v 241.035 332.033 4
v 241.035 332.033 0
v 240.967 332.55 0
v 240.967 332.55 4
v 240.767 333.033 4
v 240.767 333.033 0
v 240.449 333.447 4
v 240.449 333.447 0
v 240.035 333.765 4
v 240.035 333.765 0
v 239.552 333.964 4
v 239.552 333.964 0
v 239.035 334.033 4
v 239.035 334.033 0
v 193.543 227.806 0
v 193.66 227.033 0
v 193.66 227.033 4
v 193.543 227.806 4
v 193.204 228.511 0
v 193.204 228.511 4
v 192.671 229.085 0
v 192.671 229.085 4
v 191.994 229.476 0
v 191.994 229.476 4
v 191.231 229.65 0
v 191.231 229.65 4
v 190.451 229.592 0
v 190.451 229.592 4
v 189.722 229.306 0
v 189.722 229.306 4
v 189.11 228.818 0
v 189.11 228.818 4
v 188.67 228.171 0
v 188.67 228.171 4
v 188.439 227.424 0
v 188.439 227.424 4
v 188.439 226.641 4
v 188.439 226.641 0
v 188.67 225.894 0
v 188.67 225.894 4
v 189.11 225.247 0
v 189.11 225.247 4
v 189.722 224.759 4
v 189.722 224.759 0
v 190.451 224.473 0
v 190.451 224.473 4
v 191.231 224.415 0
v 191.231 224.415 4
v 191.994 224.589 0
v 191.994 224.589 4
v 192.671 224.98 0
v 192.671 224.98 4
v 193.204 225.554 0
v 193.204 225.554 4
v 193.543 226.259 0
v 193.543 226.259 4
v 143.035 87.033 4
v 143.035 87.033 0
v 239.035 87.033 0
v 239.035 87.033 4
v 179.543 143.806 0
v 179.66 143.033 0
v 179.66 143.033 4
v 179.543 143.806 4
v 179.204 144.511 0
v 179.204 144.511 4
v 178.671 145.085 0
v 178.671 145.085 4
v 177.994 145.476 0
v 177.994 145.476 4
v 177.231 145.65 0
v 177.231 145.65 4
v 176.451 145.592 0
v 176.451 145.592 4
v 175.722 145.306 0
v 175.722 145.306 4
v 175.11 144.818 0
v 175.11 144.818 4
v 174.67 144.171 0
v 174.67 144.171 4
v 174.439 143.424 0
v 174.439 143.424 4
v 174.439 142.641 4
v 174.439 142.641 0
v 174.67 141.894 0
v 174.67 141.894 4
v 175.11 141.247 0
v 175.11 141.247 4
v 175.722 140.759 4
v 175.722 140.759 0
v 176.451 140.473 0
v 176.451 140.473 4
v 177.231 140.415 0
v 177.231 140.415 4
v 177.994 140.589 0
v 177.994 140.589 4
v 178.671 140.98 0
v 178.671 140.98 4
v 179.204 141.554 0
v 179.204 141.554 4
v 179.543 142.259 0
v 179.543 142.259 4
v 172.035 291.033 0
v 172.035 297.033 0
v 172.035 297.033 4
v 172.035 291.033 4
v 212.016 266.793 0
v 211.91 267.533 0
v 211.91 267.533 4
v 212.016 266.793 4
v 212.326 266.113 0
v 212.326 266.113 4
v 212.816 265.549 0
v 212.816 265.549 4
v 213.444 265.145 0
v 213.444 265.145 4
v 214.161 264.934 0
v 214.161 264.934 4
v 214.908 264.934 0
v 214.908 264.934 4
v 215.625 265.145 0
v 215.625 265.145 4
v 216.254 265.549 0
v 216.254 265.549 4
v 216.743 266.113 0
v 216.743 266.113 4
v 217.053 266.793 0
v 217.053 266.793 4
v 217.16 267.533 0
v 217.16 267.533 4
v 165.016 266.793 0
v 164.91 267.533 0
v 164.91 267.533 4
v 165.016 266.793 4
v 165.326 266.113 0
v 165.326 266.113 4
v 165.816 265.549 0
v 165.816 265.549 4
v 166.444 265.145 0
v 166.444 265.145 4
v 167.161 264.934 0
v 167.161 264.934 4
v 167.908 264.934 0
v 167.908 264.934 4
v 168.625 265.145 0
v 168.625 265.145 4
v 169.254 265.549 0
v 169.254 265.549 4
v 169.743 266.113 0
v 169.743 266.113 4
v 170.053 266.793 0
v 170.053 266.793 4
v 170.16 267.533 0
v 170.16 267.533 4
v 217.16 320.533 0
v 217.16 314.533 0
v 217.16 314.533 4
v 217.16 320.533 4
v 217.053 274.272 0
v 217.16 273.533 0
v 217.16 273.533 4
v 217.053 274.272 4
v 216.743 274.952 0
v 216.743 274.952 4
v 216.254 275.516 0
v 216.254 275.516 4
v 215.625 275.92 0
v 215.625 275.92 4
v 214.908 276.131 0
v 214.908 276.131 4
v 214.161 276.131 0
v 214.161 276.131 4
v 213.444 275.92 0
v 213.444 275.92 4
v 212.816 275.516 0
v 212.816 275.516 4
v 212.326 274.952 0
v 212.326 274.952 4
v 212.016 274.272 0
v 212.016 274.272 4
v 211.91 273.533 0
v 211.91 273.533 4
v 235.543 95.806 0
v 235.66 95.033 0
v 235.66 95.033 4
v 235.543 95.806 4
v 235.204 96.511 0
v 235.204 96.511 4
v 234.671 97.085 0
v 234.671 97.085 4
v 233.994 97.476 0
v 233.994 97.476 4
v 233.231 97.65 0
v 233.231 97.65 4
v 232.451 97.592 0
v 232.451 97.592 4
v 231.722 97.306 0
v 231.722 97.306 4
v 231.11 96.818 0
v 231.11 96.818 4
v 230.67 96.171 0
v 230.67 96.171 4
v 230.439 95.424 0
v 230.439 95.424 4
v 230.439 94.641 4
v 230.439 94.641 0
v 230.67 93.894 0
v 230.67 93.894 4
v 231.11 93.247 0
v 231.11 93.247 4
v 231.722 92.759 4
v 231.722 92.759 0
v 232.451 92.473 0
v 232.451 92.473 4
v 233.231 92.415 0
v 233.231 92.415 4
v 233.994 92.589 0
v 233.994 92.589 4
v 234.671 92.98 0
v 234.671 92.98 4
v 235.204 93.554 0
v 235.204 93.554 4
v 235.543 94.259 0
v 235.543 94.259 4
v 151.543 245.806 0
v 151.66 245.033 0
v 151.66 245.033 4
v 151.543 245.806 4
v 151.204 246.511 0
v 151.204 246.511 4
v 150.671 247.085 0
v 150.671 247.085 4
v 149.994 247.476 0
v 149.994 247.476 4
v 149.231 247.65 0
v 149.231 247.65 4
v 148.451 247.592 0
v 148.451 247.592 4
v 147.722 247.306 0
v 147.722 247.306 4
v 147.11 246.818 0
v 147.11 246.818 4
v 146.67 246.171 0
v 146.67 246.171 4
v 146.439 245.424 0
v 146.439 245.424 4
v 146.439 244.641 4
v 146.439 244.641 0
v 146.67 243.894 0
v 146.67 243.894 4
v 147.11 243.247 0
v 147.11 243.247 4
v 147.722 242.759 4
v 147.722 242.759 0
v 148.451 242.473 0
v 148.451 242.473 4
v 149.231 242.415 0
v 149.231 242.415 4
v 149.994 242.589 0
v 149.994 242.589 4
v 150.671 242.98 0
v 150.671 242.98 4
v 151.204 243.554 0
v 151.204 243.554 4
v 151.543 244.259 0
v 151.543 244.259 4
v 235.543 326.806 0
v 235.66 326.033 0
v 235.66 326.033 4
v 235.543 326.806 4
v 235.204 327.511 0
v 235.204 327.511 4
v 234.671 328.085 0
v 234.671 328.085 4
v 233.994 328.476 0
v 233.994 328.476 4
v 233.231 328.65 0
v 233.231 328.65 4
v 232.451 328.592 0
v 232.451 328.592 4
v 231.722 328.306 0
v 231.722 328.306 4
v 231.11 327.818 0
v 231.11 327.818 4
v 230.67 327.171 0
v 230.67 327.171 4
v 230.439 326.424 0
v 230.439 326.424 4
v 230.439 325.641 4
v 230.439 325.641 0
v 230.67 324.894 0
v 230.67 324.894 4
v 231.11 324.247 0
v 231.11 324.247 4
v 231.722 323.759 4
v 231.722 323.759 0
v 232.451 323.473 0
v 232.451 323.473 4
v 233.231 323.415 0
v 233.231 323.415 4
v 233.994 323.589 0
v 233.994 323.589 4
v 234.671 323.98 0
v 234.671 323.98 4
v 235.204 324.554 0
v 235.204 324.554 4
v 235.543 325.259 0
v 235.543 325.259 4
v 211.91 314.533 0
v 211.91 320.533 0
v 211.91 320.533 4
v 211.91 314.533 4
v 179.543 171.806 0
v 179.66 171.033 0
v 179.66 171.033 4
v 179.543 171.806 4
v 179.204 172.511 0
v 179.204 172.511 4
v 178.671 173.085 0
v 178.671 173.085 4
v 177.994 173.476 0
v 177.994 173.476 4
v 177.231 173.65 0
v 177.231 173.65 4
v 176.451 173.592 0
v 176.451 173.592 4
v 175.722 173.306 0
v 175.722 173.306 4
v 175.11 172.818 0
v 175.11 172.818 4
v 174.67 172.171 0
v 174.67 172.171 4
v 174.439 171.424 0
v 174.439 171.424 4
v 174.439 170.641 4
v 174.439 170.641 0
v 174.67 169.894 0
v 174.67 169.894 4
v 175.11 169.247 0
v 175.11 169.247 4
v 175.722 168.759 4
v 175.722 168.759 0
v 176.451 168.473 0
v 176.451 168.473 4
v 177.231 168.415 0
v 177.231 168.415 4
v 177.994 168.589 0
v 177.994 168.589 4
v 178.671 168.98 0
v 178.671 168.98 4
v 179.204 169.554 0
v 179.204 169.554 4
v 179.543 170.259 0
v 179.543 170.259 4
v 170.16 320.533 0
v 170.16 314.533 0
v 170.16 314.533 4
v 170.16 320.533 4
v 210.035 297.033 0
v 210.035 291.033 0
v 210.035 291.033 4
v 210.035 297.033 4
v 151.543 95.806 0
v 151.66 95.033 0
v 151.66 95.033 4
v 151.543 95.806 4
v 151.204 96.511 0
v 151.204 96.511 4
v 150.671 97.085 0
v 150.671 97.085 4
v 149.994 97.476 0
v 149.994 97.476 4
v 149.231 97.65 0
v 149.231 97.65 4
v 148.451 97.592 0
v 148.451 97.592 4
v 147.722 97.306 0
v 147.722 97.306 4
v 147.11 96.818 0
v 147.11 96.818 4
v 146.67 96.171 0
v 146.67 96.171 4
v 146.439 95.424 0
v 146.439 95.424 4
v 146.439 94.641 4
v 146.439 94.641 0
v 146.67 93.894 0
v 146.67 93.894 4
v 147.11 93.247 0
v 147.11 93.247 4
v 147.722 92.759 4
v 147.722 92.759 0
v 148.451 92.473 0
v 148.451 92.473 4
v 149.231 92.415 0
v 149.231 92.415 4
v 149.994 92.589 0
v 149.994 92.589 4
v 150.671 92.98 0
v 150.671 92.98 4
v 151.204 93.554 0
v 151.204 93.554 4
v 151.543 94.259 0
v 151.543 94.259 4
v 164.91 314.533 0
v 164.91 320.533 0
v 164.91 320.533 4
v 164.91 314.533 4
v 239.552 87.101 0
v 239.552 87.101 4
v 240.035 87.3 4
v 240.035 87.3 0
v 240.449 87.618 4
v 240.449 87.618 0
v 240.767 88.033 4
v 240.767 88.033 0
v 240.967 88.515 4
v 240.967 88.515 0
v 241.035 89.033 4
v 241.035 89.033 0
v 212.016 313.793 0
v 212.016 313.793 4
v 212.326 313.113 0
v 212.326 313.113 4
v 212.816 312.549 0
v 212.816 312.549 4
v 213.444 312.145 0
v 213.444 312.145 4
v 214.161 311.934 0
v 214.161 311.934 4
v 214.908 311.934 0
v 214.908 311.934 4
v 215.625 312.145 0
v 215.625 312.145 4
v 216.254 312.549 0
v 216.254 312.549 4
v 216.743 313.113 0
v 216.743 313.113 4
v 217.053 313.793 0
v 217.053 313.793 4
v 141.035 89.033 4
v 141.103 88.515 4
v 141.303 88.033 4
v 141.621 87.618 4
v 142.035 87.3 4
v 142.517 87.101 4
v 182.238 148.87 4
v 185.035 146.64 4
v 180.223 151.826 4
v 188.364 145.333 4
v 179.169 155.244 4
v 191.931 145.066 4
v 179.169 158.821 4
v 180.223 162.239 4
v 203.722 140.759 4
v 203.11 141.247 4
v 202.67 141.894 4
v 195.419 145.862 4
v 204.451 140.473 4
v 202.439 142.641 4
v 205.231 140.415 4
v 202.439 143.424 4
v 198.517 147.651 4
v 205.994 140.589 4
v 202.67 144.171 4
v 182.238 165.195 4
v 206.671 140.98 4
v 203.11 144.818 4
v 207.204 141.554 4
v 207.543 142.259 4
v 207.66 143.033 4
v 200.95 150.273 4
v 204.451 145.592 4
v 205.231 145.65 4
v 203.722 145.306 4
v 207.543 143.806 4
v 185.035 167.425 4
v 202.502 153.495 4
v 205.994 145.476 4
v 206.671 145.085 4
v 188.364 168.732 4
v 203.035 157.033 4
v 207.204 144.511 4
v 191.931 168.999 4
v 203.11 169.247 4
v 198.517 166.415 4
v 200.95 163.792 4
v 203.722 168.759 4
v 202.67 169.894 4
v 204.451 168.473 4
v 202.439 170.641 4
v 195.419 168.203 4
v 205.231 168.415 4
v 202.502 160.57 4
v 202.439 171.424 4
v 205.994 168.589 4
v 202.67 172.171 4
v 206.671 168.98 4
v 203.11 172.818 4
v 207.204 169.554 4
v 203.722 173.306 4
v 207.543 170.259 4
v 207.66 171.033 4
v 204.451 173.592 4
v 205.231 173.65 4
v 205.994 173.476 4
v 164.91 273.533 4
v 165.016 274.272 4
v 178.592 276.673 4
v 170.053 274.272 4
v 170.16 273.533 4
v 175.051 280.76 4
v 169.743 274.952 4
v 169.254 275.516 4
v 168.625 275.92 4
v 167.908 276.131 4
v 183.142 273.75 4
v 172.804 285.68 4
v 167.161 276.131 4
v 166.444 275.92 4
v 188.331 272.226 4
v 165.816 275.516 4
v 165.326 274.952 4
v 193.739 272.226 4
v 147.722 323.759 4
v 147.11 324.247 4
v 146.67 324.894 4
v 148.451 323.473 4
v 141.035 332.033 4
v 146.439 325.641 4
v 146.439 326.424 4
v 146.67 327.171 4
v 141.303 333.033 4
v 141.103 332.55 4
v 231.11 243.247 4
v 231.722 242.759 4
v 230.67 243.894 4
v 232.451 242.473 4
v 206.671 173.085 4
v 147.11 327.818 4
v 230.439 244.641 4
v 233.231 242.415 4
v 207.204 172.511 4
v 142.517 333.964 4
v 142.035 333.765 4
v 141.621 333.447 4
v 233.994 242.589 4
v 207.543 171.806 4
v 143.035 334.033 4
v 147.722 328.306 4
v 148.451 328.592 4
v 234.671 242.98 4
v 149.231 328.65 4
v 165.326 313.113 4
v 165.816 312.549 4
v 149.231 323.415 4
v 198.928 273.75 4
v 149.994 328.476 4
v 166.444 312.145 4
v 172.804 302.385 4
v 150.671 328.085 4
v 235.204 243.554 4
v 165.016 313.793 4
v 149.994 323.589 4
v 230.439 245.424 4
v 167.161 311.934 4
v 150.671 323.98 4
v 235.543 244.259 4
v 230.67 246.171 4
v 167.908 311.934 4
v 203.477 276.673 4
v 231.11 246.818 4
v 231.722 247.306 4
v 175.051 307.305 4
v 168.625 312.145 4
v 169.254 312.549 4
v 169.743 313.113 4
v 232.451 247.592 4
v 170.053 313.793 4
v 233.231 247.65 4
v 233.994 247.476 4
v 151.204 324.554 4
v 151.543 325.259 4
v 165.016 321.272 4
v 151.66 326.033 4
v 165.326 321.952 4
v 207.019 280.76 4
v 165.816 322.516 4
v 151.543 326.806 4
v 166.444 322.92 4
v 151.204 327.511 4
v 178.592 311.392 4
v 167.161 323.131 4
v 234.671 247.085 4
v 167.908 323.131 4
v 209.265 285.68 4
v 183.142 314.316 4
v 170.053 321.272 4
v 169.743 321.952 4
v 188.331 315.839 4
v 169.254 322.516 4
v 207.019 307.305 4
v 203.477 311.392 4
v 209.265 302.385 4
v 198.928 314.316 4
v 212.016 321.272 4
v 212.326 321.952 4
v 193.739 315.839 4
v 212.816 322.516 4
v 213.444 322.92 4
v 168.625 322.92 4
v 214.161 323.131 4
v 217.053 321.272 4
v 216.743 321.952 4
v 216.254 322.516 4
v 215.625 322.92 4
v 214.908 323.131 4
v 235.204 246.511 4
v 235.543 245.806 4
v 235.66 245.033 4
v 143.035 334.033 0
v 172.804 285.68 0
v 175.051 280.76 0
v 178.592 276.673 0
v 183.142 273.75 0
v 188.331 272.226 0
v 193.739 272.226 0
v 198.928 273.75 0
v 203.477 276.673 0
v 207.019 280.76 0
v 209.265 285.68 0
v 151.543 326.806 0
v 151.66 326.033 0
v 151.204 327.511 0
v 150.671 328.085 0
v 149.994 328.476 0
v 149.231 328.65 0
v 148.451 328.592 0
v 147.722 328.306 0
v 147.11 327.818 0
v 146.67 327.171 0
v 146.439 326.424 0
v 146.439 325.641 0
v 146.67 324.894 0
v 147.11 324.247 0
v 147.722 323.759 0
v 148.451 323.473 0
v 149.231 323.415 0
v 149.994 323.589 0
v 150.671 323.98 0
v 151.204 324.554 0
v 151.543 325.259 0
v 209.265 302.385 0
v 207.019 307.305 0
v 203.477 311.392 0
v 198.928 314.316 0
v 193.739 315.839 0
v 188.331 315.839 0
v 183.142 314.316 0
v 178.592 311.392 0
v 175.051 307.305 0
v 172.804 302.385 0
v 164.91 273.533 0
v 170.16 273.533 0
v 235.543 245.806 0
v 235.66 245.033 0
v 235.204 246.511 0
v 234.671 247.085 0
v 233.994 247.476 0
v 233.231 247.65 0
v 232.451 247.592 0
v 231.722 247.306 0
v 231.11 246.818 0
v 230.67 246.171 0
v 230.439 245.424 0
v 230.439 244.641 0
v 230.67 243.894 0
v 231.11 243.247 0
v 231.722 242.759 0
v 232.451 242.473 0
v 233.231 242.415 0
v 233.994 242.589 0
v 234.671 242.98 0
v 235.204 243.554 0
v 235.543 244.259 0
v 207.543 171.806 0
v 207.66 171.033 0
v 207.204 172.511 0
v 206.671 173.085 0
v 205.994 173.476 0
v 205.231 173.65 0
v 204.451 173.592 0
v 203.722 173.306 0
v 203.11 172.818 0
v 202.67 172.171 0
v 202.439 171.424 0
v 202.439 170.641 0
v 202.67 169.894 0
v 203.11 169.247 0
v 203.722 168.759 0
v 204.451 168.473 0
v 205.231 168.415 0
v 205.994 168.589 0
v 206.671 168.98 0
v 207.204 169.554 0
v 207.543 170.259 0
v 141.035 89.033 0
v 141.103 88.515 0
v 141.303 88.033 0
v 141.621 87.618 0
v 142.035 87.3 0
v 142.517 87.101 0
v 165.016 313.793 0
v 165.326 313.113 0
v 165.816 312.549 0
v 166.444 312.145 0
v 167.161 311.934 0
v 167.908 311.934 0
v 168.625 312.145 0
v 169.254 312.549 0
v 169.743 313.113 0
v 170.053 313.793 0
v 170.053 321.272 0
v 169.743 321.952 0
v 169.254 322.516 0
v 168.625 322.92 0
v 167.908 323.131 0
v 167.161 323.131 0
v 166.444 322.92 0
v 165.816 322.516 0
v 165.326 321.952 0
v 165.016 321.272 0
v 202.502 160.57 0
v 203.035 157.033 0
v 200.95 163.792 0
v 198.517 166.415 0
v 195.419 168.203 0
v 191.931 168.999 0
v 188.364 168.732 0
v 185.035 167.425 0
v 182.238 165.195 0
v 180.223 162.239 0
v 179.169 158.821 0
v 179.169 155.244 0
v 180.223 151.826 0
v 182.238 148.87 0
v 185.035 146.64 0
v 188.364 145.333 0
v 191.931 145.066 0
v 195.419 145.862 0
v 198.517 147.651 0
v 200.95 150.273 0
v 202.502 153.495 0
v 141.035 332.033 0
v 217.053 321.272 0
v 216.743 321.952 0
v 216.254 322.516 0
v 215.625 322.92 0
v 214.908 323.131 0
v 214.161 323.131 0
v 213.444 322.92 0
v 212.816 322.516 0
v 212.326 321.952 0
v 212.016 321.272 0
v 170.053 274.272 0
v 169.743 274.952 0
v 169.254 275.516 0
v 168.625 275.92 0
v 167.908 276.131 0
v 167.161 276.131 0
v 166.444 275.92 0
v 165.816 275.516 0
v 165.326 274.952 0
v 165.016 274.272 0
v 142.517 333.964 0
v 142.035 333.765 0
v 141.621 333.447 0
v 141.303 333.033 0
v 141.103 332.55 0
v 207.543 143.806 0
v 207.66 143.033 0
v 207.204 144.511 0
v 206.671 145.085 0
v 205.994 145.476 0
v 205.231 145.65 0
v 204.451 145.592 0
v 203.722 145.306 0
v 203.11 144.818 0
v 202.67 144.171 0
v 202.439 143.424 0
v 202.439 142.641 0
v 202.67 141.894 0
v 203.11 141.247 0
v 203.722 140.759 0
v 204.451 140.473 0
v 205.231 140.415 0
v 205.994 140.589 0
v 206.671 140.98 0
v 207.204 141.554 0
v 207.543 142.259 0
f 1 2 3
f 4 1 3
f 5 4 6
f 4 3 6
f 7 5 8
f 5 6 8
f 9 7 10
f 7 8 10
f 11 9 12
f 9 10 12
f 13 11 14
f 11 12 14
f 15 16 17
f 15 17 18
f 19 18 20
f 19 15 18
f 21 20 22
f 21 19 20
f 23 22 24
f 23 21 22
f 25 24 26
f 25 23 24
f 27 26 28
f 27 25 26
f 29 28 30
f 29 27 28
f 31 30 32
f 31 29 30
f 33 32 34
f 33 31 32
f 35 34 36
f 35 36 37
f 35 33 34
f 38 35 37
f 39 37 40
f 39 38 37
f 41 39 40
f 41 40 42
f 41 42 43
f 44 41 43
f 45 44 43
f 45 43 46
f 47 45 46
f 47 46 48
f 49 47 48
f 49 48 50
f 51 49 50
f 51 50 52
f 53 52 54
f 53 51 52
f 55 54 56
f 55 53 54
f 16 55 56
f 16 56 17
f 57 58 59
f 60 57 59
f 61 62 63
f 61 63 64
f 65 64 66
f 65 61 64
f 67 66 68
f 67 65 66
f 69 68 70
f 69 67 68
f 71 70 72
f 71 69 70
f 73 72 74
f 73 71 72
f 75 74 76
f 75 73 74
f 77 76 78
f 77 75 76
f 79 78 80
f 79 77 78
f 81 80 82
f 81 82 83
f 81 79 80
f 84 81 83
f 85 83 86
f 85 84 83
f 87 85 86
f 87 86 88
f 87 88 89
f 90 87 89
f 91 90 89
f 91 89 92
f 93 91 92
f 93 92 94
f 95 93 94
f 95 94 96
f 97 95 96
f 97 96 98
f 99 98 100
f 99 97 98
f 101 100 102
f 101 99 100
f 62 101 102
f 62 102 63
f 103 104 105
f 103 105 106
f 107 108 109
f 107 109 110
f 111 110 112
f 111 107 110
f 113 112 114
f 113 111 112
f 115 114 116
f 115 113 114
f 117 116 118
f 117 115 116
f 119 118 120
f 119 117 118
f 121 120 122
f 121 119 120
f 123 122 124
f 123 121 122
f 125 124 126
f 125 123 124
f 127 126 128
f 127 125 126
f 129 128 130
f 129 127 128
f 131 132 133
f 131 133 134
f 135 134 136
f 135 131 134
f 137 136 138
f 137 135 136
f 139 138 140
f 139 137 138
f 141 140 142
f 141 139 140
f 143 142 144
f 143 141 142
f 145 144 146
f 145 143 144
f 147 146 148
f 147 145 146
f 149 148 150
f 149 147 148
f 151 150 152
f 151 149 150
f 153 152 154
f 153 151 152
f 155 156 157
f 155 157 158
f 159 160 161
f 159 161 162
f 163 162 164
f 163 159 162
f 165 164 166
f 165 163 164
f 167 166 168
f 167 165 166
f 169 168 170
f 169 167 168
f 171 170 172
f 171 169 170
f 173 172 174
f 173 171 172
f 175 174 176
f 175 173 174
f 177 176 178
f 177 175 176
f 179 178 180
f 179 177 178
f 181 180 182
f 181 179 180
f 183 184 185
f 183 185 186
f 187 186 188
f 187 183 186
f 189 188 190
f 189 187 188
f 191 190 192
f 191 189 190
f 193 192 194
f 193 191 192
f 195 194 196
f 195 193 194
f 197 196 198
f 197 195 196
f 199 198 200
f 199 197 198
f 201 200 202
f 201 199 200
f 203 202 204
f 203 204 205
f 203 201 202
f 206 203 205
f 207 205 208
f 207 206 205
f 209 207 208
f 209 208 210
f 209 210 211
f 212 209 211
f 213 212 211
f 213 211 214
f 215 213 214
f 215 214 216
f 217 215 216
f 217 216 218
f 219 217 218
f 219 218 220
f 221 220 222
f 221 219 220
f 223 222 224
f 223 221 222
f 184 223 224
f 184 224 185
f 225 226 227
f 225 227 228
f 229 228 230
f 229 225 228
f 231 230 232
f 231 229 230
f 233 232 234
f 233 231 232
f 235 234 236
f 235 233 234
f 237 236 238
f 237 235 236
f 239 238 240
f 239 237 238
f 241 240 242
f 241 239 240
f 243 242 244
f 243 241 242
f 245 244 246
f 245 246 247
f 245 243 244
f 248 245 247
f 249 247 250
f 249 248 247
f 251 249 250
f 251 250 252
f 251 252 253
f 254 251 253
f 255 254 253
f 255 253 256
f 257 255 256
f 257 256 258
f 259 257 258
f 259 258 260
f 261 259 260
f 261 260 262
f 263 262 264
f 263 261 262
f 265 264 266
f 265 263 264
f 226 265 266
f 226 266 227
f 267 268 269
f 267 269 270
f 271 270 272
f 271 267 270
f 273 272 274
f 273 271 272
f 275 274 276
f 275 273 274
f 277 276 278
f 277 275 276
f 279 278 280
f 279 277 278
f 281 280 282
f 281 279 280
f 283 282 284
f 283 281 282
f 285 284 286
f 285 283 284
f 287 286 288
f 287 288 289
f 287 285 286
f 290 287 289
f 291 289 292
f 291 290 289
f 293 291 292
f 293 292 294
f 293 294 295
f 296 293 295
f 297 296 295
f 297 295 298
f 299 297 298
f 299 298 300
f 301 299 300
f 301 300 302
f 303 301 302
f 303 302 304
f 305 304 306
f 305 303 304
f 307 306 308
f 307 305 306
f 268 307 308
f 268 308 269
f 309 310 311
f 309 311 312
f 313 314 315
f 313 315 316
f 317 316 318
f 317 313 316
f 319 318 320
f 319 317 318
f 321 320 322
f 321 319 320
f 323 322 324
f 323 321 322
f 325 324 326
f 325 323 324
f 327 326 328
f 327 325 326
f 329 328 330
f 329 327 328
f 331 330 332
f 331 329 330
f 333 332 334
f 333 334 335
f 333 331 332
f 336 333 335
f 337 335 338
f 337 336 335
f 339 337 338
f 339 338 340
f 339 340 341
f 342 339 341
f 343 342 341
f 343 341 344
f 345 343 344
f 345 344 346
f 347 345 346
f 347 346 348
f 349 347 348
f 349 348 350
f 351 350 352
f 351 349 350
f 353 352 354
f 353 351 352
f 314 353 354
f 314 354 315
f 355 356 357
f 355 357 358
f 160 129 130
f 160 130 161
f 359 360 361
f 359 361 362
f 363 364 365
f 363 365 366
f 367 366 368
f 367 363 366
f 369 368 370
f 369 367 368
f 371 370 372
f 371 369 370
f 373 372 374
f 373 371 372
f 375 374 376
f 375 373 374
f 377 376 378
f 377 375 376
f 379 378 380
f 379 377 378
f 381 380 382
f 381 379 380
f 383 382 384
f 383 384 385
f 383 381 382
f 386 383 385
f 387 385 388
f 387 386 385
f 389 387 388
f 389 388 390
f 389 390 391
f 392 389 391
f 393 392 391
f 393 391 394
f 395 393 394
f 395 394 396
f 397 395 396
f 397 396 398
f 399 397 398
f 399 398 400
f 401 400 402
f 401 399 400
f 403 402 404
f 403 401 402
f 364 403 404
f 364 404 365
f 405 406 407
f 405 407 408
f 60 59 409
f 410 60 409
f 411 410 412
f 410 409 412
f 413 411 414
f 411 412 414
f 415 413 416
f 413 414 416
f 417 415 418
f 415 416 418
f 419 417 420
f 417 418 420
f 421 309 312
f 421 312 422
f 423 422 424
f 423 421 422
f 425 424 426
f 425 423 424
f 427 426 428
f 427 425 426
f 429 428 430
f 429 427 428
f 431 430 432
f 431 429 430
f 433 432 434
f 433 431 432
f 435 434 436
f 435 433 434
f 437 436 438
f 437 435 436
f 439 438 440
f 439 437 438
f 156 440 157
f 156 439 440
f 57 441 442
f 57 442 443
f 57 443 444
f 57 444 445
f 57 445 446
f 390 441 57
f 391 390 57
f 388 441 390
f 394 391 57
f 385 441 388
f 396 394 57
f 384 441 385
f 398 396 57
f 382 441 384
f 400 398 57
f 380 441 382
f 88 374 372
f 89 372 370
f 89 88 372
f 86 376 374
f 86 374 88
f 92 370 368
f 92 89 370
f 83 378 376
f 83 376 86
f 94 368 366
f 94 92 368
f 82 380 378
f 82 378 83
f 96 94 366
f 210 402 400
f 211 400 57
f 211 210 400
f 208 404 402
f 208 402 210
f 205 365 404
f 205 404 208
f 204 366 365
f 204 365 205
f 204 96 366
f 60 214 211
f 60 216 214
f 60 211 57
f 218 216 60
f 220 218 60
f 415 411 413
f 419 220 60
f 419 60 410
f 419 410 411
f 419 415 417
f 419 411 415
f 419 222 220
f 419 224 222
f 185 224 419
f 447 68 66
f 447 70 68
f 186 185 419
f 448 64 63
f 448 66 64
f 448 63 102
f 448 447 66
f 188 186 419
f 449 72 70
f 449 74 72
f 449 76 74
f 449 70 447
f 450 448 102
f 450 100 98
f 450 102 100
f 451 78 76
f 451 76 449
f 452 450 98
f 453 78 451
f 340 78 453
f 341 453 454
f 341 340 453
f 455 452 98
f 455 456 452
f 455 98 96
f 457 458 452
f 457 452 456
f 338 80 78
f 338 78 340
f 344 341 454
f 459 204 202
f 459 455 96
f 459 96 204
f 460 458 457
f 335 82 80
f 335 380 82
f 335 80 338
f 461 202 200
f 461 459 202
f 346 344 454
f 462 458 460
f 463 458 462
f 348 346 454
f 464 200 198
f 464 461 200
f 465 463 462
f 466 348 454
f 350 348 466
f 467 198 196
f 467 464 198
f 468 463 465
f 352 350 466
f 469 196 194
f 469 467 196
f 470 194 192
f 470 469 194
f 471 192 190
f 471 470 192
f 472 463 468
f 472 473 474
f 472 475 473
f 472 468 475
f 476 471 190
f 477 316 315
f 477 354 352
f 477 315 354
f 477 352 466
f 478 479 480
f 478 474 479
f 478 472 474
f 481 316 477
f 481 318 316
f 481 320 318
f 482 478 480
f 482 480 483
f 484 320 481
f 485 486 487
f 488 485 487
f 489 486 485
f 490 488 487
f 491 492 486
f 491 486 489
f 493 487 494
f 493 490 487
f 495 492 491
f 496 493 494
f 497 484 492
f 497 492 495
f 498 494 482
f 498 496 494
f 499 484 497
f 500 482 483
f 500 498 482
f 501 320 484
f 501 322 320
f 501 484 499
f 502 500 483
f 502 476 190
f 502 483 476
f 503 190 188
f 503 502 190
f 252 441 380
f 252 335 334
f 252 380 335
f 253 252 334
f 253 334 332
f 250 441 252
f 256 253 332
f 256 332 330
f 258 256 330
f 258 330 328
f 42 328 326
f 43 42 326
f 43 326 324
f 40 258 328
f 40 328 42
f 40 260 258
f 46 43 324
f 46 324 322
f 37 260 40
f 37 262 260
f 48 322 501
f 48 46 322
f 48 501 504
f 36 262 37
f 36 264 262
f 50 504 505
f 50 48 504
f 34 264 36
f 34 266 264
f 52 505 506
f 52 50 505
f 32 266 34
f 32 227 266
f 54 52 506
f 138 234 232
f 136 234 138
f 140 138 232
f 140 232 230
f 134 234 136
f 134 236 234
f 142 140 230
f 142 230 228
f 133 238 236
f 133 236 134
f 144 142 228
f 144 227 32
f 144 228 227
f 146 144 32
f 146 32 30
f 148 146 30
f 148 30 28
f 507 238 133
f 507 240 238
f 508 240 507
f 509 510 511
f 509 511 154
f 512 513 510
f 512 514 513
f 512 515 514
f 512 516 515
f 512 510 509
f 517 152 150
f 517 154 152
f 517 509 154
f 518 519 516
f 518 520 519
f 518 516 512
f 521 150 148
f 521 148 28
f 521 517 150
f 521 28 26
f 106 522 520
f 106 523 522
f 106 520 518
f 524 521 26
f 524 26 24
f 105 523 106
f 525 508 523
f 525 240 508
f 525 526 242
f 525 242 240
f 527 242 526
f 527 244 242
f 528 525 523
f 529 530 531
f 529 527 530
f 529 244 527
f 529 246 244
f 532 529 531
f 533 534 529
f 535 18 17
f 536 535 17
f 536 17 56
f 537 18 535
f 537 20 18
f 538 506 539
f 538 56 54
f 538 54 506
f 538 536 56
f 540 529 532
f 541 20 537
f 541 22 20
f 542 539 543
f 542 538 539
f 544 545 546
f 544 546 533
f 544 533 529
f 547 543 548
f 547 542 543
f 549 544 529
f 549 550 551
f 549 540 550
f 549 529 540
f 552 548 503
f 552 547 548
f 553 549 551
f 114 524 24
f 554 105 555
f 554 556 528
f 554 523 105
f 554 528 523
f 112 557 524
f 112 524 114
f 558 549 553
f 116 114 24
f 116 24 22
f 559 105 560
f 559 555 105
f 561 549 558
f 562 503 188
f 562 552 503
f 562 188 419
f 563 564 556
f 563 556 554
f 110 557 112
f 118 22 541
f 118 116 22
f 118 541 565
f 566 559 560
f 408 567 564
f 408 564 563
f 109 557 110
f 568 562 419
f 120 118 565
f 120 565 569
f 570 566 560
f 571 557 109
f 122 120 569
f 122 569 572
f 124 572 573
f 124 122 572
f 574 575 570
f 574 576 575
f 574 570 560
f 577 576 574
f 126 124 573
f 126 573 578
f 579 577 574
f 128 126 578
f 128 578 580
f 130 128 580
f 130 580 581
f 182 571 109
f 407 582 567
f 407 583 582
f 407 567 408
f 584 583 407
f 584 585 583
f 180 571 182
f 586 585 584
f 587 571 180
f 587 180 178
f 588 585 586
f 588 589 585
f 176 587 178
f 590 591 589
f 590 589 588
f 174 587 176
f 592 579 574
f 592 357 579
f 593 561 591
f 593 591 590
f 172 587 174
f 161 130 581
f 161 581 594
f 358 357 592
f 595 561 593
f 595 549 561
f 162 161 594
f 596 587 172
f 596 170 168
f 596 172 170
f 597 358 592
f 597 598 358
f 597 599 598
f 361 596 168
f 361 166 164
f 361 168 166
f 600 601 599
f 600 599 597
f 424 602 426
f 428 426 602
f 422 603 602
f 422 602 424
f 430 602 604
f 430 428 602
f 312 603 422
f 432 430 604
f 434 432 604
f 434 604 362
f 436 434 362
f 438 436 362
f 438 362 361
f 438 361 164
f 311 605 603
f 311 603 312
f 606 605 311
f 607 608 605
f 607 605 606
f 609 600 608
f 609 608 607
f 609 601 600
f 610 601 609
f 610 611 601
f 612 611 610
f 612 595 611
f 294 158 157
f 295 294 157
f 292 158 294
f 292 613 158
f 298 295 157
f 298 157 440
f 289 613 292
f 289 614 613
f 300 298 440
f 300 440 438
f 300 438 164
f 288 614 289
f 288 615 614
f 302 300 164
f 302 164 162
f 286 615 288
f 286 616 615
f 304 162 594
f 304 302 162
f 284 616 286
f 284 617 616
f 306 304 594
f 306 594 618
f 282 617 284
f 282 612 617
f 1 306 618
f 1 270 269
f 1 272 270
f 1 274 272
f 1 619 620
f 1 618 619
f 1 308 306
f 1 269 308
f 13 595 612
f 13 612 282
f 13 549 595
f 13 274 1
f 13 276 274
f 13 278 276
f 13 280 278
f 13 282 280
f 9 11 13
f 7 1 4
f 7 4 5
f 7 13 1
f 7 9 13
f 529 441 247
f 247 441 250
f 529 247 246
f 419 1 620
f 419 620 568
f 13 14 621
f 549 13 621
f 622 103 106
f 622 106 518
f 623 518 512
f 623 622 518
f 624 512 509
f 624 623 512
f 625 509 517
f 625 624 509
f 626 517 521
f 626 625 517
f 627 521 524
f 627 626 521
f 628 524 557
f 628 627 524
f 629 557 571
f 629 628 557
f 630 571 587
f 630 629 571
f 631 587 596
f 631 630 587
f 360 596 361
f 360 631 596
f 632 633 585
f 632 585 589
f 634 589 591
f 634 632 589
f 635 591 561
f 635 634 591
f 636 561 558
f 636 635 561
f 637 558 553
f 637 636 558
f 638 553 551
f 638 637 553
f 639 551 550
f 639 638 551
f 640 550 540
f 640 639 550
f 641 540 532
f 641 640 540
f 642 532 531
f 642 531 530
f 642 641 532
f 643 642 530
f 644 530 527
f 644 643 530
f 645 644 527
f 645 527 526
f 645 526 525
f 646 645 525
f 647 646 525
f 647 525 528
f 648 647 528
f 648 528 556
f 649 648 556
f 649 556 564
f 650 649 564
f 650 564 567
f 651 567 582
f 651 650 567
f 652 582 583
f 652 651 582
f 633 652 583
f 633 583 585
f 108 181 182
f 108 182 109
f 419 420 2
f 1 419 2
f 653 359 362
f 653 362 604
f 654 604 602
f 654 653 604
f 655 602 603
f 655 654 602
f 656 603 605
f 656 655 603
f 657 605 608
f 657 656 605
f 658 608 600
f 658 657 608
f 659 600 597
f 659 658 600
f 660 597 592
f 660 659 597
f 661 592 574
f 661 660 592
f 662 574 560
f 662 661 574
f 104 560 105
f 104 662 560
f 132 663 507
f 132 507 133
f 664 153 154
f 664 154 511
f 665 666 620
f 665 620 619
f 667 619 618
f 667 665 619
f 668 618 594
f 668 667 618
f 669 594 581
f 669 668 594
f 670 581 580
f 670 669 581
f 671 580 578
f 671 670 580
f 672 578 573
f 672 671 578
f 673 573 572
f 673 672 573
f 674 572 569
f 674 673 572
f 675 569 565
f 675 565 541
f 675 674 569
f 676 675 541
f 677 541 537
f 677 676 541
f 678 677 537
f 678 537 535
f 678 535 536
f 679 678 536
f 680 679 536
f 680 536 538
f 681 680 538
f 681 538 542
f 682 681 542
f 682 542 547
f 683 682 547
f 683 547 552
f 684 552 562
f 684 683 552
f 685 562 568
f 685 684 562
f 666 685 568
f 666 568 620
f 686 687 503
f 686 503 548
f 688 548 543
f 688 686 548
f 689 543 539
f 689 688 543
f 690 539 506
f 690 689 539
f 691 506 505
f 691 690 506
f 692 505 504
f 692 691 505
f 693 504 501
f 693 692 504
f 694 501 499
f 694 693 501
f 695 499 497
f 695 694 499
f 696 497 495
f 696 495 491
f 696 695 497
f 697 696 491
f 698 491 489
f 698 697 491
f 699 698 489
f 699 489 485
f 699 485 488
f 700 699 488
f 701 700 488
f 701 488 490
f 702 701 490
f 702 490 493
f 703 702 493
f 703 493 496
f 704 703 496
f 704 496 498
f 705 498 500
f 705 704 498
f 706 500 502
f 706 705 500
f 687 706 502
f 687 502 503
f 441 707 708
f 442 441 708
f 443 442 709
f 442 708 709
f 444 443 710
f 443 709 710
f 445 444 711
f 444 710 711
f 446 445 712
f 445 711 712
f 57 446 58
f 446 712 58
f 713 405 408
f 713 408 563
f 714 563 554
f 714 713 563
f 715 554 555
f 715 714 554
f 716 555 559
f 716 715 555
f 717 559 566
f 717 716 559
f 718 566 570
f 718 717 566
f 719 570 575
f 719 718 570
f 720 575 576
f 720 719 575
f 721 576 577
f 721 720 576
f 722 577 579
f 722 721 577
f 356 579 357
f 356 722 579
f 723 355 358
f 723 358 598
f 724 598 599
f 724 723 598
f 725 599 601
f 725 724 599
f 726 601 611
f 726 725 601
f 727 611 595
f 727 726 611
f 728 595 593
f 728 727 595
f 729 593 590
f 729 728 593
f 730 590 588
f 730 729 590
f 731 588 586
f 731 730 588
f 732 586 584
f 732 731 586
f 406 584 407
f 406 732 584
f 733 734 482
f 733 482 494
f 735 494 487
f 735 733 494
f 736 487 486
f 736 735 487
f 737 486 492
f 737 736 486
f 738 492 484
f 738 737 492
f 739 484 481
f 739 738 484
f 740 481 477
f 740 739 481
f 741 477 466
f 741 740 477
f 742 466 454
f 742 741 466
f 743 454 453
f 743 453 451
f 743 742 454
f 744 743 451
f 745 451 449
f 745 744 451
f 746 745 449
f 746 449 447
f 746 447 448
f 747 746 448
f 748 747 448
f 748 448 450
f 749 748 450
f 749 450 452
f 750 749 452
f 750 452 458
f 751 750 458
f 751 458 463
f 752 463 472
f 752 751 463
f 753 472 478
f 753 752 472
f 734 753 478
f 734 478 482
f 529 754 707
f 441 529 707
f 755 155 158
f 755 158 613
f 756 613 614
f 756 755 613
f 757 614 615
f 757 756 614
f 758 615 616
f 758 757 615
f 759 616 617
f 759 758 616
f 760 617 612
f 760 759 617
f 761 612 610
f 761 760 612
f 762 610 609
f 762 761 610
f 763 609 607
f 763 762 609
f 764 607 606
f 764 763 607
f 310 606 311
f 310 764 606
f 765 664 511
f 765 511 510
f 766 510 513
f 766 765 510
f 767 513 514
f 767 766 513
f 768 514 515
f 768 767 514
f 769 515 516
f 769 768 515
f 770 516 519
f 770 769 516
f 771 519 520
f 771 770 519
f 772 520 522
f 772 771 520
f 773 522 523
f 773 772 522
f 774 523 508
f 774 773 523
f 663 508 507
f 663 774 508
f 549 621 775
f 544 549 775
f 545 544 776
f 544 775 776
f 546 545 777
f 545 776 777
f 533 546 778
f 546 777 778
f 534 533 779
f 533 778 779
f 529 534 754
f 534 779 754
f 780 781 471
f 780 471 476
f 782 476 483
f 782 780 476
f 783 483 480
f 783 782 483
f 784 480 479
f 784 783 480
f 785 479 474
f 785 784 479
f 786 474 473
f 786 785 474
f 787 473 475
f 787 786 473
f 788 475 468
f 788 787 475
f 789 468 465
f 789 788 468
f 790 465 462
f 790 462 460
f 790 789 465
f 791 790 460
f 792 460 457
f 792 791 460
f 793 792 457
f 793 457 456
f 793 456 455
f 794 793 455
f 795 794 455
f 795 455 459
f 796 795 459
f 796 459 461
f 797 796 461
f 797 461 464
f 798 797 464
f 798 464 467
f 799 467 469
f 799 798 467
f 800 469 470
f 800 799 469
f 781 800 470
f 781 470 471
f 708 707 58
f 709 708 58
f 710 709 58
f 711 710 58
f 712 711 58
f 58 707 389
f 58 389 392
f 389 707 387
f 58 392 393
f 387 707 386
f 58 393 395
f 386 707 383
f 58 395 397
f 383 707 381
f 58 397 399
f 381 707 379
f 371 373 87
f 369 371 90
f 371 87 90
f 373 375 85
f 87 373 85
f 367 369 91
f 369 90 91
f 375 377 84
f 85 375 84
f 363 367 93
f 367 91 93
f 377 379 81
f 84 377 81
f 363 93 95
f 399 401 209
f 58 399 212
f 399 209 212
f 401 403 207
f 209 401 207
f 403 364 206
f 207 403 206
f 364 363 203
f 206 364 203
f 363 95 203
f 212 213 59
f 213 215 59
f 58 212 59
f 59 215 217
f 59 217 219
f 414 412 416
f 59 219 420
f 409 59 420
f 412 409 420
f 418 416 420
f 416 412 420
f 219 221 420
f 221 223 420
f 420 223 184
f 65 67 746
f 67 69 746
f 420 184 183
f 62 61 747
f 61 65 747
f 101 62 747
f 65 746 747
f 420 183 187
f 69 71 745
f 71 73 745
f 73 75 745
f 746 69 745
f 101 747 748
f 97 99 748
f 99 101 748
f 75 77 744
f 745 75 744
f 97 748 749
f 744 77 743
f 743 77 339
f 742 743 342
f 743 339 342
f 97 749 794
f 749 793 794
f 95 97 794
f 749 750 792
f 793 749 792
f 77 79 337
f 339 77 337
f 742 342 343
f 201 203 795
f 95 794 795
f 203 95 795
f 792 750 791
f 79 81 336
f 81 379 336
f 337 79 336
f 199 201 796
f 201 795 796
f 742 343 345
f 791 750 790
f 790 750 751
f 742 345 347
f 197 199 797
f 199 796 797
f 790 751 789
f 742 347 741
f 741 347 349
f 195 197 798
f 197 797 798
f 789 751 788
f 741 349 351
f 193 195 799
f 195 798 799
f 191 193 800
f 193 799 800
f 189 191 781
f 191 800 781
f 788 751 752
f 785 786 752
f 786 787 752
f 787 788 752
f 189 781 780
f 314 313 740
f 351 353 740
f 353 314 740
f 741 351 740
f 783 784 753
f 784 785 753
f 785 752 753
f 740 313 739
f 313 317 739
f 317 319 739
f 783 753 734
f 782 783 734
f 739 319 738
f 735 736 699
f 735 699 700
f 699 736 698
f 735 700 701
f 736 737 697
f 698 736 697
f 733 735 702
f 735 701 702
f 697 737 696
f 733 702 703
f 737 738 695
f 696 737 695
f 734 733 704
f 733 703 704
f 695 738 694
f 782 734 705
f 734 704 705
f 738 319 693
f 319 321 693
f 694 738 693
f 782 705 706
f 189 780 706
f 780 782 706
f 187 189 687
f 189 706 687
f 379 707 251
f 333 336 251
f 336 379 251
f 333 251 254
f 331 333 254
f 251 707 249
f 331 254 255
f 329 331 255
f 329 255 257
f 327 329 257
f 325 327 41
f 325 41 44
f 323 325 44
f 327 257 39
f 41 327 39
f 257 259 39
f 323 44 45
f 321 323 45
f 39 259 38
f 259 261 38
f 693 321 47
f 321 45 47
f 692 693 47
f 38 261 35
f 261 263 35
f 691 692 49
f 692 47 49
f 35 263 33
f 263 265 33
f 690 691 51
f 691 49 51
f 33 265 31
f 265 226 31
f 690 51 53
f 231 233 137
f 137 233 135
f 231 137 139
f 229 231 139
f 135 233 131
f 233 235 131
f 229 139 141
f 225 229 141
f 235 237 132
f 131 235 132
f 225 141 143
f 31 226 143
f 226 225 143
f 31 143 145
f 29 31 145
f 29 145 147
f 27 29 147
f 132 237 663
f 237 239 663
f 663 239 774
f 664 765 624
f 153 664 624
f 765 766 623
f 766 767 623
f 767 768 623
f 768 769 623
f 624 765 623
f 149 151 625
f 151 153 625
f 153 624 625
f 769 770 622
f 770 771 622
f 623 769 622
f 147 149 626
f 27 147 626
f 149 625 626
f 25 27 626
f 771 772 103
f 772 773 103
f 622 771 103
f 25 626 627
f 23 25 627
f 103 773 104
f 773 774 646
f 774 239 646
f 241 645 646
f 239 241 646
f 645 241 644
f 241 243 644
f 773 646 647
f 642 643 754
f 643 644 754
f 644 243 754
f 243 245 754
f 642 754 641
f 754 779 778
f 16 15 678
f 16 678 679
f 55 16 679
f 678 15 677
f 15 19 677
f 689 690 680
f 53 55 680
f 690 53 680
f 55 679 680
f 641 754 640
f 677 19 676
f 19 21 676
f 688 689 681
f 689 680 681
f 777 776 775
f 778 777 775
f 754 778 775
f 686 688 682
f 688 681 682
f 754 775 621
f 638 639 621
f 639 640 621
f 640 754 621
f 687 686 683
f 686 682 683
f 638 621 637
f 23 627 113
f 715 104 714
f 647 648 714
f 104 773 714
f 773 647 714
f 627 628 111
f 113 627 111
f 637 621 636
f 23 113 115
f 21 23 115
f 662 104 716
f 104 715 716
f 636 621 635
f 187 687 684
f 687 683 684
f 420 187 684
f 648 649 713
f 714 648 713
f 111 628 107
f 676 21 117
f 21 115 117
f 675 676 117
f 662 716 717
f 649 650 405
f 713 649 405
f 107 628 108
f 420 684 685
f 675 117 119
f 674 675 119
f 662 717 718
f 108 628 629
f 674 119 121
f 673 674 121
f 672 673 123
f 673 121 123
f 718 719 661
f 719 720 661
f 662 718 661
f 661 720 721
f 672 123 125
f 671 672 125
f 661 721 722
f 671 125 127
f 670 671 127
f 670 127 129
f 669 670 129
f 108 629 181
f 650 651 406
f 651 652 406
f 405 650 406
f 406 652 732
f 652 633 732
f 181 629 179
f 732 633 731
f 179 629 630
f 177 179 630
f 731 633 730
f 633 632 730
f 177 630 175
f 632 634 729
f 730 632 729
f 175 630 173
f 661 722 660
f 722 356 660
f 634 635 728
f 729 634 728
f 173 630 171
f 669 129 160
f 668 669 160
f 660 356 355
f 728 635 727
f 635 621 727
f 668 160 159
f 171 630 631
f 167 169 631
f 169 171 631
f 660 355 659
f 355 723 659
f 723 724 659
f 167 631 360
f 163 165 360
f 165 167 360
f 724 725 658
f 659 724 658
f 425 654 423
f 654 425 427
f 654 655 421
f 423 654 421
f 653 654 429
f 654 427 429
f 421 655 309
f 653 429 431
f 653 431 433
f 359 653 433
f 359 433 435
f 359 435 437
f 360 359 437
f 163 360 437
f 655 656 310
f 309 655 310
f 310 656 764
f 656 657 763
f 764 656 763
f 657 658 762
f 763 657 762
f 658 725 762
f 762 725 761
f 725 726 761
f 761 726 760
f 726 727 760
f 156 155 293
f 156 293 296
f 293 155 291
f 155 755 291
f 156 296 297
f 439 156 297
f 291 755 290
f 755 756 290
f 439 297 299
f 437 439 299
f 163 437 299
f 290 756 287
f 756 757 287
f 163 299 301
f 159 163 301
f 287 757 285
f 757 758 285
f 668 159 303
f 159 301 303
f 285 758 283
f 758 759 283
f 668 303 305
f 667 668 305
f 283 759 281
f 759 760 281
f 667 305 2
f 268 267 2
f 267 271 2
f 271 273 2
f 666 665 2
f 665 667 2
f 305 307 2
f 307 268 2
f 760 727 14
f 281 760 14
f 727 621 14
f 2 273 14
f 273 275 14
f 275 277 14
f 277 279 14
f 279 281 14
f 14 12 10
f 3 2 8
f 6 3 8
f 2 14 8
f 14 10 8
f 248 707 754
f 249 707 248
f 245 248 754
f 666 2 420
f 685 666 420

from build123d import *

# Parameters (mm, degrees)
MODEL_R         = 12
MODEL_R_2       = 2.625
EXTRUDE_1_DEPTH = 4


with BuildPart() as part:
    # Model → 凸台-拉伸1 (new body)
    with BuildSketch(Plane.XY):
        with BuildLine():
            Line((239.034732394, 334.032549296), (143.034732394, 334.032549296))
            ThreePointArc((143.034732394, 334.032549296), (141.620518832, 333.446762858), (141.034732394, 332.032549296))
            Line((141.034732394, 332.032549296), (141.034732394, 89.032549296))
            ThreePointArc((141.034732394, 89.032549296), (141.620518832, 87.618335733), (143.034732394, 87.032549296))
            Line((143.034732394, 87.032549296), (239.034732394, 87.032549296))
            ThreePointArc((239.034732394, 87.032549296), (240.448945957, 87.618335733), (241.034732394, 89.032549296))
            Line((241.034732394, 89.032549296), (241.034732394, 332.032549296))
            ThreePointArc((241.034732394, 332.032549296), (240.448945957, 333.446762858), (239.034732394, 334.032549296))
        make_face()
        with Locations((191.034732394, 157.032549296)):
            Circle(MODEL_R, mode=Mode.SUBTRACT)
        with Locations((177.034732394, 171.032549296)):
            Circle(MODEL_R_2, mode=Mode.SUBTRACT)
        with Locations((205.034732394, 171.032549296)):
            Circle(MODEL_R_2, mode=Mode.SUBTRACT)
        with Locations((177.034732394, 143.032549296)):
            Circle(MODEL_R_2, mode=Mode.SUBTRACT)
        with Locations((205.034732394, 143.032549296)):
            Circle(MODEL_R_2, mode=Mode.SUBTRACT)
        with Locations((149.034732394, 95.032549296)):
            Circle(MODEL_R_2, mode=Mode.SUBTRACT)
        with Locations((233.034732394, 95.032549296)):
            Circle(MODEL_R_2, mode=Mode.SUBTRACT)
        with Locations((149.034732394, 245.032549296)):
            Circle(MODEL_R_2, mode=Mode.SUBTRACT)
        with Locations((233.034732394, 245.032549296)):
            Circle(MODEL_R_2, mode=Mode.SUBTRACT)
        with Locations((149.034732394, 326.032549296)):
            Circle(MODEL_R_2, mode=Mode.SUBTRACT)
        with Locations((233.034732394, 326.032549296)):
            Circle(MODEL_R_2, mode=Mode.SUBTRACT)
        with Locations((191.034732394, 227.032549296)):
            Circle(MODEL_R_2, mode=Mode.SUBTRACT)
        with BuildLine():
            Line((217.159732394, 314.532549296), (217.159732394, 320.532549296))
            ThreePointArc((217.159732394, 320.532549296), (214.534732394, 323.157549296), (211.909732394, 320.532549296))
            Line((211.909732394, 320.532549296), (211.909732394, 314.532549296))
            ThreePointArc((211.909732394, 314.532549296), (214.534732394, 311.907549296), (217.159732394, 314.532549296))
        make_face(mode=Mode.SUBTRACT)
        with BuildLine():
            Line((217.159732394, 267.532549296), (217.159732394, 273.532549296))
            ThreePointArc((217.159732394, 273.532549296), (214.534732394, 276.157549296), (211.909732394, 273.532549296))
            Line((211.909732394, 273.532549296), (211.909732394, 267.532549296))
            ThreePointArc((211.909732394, 267.532549296), (214.534732394, 264.907549296), (217.159732394, 267.532549296))
        make_face(mode=Mode.SUBTRACT)
        with BuildLine():
            Line((172.034732394, 297.032549296), (172.034732394, 291.032549296))
            ThreePointArc((172.034732394, 291.032549296), (191.034732394, 272.032549296), (210.034732394, 291.032549296))
            Line((210.034732394, 291.032549296), (210.034732394, 297.032549296))
            ThreePointArc((210.034732394, 297.032549296), (191.034732394, 316.032549296), (172.034732394, 297.032549296))
        make_face(mode=Mode.SUBTRACT)
        with BuildLine():
            Line((170.159732394, 267.532549296), (170.159732394, 273.532549296))
            ThreePointArc((170.159732394, 273.532549296), (167.534732394, 276.157549296), (164.909732394, 273.532549296))
            Line((164.909732394, 273.532549296), (164.909732394, 267.532549296))
            ThreePointArc((164.909732394, 267.532549296), (167.534732394, 264.907549296), (170.159732394, 267.532549296))
        make_face(mode=Mode.SUBTRACT)
        with BuildLine():
            Line((170.159732394, 314.532549296), (170.159732394, 320.532549296))
            ThreePointArc((170.159732394, 320.532549296), (167.534732394, 323.157549296), (164.909732394, 320.532549296))
            Line((164.909732394, 320.532549296), (164.909732394, 314.532549296))
            ThreePointArc((164.909732394, 314.532549296), (167.534732394, 311.907549296), (170.159732394, 314.532549296))
        make_face(mode=Mode.SUBTRACT)
    extrude(amount=EXTRUDE_1_DEPTH)


solid = part.part
